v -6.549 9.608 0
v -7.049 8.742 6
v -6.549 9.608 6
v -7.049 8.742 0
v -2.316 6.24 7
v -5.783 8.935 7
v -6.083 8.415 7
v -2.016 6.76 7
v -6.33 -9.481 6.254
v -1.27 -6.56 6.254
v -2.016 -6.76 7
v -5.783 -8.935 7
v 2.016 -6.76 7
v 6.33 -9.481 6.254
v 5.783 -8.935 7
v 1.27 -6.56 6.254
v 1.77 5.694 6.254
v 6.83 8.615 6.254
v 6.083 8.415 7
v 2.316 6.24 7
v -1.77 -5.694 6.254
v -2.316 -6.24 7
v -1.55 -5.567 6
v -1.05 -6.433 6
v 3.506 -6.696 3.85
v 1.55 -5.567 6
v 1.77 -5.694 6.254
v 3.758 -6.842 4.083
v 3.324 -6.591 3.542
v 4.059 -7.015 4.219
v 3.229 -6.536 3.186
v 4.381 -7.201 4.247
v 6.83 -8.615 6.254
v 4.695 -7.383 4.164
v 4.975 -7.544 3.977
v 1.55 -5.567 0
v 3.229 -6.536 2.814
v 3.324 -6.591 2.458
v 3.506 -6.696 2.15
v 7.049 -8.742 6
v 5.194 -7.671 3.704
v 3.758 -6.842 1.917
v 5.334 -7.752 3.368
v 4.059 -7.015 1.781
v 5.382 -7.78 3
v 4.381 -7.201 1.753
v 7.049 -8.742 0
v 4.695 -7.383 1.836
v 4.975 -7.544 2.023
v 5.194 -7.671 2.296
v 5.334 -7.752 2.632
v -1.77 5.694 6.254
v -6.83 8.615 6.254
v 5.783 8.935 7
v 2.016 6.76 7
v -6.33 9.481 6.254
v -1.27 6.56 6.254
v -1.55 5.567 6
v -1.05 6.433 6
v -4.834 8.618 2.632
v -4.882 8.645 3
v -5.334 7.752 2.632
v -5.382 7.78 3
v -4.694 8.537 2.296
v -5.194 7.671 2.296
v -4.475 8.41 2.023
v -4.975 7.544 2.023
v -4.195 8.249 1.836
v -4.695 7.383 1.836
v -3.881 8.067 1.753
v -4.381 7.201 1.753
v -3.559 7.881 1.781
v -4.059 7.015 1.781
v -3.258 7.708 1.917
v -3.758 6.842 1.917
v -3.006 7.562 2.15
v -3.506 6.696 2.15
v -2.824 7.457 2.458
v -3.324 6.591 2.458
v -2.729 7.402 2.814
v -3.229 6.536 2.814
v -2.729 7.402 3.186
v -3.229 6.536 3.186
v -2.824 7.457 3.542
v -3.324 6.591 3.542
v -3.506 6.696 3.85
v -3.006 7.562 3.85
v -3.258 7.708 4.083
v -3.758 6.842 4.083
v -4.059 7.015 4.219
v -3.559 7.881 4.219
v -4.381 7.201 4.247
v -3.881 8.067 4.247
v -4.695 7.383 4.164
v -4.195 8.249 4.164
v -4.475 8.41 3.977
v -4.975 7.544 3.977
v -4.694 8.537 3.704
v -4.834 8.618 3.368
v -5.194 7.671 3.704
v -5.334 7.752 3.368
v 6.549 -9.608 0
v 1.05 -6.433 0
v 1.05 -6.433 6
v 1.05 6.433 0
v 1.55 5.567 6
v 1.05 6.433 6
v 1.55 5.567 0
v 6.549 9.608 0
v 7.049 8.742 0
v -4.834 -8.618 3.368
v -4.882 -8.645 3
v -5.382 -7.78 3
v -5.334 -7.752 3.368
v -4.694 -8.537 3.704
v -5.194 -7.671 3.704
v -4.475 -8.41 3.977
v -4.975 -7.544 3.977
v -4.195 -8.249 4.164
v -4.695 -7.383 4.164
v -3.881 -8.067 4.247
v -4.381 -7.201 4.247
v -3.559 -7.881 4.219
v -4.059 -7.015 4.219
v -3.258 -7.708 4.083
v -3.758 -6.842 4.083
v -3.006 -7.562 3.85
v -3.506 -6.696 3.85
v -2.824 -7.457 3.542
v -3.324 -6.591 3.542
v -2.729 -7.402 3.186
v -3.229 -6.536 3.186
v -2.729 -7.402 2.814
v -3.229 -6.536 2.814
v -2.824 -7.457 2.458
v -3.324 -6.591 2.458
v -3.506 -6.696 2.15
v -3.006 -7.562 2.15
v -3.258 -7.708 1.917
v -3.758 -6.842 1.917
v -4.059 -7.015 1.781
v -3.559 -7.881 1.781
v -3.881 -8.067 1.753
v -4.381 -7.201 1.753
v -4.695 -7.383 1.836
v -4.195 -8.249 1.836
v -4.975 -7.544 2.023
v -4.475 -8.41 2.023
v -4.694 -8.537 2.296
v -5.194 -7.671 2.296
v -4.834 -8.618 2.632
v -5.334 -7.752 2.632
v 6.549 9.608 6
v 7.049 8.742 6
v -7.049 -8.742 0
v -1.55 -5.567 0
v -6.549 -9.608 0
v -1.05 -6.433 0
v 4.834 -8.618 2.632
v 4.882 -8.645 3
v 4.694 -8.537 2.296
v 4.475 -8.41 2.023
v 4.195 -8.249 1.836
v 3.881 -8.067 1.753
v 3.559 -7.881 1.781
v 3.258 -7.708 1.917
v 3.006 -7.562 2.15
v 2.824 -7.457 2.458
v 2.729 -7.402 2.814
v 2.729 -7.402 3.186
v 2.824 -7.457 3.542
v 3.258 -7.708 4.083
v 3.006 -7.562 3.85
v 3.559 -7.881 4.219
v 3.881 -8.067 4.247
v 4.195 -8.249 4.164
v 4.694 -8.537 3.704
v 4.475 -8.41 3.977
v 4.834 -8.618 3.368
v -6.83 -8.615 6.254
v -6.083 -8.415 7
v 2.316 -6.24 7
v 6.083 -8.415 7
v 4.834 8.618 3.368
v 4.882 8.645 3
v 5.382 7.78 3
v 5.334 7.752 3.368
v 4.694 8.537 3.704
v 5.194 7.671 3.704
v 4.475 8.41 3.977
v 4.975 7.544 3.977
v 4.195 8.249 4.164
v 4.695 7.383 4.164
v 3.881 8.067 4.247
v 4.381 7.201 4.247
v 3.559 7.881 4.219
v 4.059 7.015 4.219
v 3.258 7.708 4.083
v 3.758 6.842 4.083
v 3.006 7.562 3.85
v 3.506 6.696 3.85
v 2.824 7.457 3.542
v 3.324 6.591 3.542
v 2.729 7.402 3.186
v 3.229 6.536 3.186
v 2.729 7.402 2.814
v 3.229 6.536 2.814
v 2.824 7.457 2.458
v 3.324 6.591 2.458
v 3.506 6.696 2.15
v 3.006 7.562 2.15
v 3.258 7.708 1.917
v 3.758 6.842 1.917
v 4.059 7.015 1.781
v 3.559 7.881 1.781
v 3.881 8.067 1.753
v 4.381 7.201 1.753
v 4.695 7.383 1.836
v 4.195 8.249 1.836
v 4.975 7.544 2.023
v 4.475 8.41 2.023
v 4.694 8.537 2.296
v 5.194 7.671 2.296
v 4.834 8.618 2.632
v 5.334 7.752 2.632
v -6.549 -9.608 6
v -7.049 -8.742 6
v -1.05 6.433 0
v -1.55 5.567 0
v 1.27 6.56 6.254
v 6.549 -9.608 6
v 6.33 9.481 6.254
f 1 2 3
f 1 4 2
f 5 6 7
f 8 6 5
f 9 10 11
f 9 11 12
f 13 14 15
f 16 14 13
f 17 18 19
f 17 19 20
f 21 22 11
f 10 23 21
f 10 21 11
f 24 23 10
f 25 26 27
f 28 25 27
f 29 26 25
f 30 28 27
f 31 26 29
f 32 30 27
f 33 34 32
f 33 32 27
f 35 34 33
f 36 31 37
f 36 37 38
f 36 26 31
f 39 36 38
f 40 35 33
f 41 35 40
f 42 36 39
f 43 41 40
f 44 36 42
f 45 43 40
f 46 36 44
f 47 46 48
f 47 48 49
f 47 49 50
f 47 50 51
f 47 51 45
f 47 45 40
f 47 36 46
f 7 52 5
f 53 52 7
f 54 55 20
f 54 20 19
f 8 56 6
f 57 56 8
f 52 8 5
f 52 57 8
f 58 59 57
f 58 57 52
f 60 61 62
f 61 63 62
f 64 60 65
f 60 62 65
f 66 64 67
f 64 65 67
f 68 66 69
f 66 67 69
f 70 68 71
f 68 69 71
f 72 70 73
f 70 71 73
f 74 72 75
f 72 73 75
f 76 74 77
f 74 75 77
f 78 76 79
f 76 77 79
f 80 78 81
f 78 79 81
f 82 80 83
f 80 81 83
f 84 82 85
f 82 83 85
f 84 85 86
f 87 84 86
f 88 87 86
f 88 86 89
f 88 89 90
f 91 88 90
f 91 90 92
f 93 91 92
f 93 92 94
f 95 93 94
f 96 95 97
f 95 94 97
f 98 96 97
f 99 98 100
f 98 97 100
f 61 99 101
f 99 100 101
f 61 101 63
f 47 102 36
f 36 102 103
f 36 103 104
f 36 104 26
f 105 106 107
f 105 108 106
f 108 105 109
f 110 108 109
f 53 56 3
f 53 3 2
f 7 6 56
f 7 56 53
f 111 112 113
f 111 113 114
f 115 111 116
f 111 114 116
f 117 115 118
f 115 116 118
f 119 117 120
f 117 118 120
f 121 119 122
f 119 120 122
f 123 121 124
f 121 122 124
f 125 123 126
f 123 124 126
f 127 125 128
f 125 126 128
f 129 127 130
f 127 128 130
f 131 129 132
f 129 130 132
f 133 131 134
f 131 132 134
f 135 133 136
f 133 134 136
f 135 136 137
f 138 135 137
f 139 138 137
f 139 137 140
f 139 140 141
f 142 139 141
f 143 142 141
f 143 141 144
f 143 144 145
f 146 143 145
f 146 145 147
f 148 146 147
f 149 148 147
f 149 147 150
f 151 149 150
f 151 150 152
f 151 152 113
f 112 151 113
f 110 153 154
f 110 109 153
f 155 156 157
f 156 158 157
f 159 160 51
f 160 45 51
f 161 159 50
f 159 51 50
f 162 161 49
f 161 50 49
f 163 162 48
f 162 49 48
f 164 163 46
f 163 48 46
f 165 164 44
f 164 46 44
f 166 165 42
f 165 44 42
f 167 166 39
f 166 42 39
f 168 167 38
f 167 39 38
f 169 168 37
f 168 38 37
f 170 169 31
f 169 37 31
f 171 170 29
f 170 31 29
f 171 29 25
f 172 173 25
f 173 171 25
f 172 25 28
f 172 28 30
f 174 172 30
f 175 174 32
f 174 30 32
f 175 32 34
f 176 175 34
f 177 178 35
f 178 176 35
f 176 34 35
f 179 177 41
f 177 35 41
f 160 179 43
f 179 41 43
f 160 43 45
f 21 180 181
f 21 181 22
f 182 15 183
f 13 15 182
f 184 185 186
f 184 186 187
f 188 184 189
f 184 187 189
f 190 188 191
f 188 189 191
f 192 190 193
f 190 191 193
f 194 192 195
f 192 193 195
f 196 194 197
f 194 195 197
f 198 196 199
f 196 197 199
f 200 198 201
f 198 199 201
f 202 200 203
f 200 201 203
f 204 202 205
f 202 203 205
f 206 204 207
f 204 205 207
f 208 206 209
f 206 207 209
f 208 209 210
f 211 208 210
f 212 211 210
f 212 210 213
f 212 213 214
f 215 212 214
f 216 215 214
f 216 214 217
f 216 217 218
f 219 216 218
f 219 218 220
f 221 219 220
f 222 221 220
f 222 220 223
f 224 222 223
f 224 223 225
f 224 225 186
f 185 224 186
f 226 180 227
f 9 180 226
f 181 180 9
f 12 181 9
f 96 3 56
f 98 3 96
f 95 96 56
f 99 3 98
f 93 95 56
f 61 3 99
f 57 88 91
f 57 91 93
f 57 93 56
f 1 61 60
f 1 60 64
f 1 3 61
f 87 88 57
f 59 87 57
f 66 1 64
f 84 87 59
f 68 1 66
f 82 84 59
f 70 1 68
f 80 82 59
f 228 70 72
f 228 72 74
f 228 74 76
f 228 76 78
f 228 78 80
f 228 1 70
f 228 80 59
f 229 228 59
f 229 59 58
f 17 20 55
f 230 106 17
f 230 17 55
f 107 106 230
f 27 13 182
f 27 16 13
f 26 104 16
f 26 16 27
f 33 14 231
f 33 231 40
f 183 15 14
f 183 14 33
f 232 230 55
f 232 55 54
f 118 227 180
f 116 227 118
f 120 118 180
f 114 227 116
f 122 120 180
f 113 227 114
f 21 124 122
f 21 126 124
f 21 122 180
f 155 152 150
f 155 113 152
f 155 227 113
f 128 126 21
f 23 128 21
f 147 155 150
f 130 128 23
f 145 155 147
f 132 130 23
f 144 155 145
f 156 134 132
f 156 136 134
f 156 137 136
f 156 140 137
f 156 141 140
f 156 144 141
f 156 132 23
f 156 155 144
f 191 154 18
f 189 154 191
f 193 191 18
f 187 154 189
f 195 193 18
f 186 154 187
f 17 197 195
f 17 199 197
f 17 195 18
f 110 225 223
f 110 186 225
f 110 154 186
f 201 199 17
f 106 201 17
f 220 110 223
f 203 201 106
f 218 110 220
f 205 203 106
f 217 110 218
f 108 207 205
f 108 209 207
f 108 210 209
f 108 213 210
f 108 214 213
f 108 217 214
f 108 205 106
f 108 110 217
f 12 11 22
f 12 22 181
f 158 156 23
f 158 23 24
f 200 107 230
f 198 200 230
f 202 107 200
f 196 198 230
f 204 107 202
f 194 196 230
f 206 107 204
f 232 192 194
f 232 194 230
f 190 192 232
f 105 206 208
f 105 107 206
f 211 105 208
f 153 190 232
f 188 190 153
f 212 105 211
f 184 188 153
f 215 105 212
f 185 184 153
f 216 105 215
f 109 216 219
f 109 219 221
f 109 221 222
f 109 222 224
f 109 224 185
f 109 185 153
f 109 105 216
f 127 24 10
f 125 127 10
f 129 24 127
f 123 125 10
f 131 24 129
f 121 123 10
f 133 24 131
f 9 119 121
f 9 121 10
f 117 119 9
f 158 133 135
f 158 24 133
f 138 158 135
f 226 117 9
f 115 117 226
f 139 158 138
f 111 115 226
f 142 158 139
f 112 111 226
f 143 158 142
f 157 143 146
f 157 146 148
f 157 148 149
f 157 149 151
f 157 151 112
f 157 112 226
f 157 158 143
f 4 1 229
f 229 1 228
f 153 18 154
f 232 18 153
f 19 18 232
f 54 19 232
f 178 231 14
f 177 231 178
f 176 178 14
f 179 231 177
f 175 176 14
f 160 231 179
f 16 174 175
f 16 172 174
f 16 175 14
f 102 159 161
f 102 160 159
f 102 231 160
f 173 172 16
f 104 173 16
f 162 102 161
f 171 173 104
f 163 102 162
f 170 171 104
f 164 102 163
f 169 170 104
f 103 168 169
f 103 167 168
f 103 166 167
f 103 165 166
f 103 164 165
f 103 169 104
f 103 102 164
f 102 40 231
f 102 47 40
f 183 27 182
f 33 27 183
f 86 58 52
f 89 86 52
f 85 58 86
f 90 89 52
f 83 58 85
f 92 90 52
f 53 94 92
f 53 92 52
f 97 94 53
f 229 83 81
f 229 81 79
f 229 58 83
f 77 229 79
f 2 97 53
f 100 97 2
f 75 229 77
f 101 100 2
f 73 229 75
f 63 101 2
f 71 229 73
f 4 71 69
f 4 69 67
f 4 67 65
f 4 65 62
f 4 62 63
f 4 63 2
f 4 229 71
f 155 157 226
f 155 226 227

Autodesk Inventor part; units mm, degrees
ref_plane "YZ Plane" through (0, 0, 0) normal (1, 0, 0) x (0, 1, 0)
ref_plane "XZ Plane" through (0, 0, 0) normal (0, 1, 0) x (-1, 0, 0)
ref_plane "XY Plane" through (0, 0, 0) normal (0, 0, 1) x (1, 0, 0)
sketch "Эскиз1" plane through (0, 0, 0) normal (0, 0, 1) x (1, 0, 0)
  arc A0 (3.0397, -11.35) -> (11.3865, -2.9) centre (0, 0) ccw projected
  arc A1 (-3.0397, 11.35) -> (-3.0397, -11.35) centre (0, 0) ccw projected
  arc A2 (11.3865, 2.9) -> (3.0397, 11.35) centre (0, 0) ccw projected
  line L0 (0, 11.5515) -> (0, -11.5515) construction
  line L1 (-11.75, 0) -> (11.75, 0) construction
  line L2 (6.5493, 9.608) -> (7.0493, 8.742)
  line L3 (7.0493, 8.742) -> (1.55, 5.567)
  line L4 (1.55, 5.567) -> (1.05, 6.433)
  line L5 (1.05, 6.433) -> (6.5493, 9.608)
  line L6 (6.7993, 9.175) -> (1.3, 6) construction
  point P0 (0, 0)
  point P1 (0, 0)
  dimension "d0" = 1
  dimension "d1" = 6.35
  dimension "d2" = 30
  dimension "d3" = 12
  dimension "d4" = 2.6
extrude "Выдавливание1" add sketch "Эскиз1" along normal blind 7
chamfer "Фаска1" distance 0.2 angle 75 2 edges at (4.2996, 7.1545, 7) (3.7996, 8.0205, 7) measured on face at (5.0495, 7.9723, 7)
chamfer "Фаска2" distance 1 angle 45 2 edges at (1.3, 6, 7) (6.7993, 9.175, 7)
sketch "Эскиз2" plane through (1.55, 5.567, 0) normal (0.5, -0.8660254, 0) x (0.8660254, 0.5, 0)
  circle A0 centre (3.175, 3) radius 1.25
  line L0 (5.35, 7) -> (1, 7) projected
  line L1 (6.35, 0) -> (0, 0) projected
  line L2 (3.175, 7) -> (3.175, 0) construction
  point P0 (-4.1258, 0)
  dimension "d13" = 2.5
  dimension "d14" = 4
extrude "Выдавливание2" cut sketch "Эскиз2" against normal up to next
pattern_circular "Круговой массив1" count 2 over 360 about axis through (0, 0, -10) along (0, 0, 1) of "Выдавливание1", "Фаска1", "Фаска2", "Выдавливание2"
mirror "Зеркальное отражение1" about plane through (0, 0, 0) normal (1, 0, 0) of "Выдавливание1", "Фаска1", "Фаска2", "Выдавливание2", "Круговой массив1"
properties part number "contact" material "Нержавеющая сталь"
